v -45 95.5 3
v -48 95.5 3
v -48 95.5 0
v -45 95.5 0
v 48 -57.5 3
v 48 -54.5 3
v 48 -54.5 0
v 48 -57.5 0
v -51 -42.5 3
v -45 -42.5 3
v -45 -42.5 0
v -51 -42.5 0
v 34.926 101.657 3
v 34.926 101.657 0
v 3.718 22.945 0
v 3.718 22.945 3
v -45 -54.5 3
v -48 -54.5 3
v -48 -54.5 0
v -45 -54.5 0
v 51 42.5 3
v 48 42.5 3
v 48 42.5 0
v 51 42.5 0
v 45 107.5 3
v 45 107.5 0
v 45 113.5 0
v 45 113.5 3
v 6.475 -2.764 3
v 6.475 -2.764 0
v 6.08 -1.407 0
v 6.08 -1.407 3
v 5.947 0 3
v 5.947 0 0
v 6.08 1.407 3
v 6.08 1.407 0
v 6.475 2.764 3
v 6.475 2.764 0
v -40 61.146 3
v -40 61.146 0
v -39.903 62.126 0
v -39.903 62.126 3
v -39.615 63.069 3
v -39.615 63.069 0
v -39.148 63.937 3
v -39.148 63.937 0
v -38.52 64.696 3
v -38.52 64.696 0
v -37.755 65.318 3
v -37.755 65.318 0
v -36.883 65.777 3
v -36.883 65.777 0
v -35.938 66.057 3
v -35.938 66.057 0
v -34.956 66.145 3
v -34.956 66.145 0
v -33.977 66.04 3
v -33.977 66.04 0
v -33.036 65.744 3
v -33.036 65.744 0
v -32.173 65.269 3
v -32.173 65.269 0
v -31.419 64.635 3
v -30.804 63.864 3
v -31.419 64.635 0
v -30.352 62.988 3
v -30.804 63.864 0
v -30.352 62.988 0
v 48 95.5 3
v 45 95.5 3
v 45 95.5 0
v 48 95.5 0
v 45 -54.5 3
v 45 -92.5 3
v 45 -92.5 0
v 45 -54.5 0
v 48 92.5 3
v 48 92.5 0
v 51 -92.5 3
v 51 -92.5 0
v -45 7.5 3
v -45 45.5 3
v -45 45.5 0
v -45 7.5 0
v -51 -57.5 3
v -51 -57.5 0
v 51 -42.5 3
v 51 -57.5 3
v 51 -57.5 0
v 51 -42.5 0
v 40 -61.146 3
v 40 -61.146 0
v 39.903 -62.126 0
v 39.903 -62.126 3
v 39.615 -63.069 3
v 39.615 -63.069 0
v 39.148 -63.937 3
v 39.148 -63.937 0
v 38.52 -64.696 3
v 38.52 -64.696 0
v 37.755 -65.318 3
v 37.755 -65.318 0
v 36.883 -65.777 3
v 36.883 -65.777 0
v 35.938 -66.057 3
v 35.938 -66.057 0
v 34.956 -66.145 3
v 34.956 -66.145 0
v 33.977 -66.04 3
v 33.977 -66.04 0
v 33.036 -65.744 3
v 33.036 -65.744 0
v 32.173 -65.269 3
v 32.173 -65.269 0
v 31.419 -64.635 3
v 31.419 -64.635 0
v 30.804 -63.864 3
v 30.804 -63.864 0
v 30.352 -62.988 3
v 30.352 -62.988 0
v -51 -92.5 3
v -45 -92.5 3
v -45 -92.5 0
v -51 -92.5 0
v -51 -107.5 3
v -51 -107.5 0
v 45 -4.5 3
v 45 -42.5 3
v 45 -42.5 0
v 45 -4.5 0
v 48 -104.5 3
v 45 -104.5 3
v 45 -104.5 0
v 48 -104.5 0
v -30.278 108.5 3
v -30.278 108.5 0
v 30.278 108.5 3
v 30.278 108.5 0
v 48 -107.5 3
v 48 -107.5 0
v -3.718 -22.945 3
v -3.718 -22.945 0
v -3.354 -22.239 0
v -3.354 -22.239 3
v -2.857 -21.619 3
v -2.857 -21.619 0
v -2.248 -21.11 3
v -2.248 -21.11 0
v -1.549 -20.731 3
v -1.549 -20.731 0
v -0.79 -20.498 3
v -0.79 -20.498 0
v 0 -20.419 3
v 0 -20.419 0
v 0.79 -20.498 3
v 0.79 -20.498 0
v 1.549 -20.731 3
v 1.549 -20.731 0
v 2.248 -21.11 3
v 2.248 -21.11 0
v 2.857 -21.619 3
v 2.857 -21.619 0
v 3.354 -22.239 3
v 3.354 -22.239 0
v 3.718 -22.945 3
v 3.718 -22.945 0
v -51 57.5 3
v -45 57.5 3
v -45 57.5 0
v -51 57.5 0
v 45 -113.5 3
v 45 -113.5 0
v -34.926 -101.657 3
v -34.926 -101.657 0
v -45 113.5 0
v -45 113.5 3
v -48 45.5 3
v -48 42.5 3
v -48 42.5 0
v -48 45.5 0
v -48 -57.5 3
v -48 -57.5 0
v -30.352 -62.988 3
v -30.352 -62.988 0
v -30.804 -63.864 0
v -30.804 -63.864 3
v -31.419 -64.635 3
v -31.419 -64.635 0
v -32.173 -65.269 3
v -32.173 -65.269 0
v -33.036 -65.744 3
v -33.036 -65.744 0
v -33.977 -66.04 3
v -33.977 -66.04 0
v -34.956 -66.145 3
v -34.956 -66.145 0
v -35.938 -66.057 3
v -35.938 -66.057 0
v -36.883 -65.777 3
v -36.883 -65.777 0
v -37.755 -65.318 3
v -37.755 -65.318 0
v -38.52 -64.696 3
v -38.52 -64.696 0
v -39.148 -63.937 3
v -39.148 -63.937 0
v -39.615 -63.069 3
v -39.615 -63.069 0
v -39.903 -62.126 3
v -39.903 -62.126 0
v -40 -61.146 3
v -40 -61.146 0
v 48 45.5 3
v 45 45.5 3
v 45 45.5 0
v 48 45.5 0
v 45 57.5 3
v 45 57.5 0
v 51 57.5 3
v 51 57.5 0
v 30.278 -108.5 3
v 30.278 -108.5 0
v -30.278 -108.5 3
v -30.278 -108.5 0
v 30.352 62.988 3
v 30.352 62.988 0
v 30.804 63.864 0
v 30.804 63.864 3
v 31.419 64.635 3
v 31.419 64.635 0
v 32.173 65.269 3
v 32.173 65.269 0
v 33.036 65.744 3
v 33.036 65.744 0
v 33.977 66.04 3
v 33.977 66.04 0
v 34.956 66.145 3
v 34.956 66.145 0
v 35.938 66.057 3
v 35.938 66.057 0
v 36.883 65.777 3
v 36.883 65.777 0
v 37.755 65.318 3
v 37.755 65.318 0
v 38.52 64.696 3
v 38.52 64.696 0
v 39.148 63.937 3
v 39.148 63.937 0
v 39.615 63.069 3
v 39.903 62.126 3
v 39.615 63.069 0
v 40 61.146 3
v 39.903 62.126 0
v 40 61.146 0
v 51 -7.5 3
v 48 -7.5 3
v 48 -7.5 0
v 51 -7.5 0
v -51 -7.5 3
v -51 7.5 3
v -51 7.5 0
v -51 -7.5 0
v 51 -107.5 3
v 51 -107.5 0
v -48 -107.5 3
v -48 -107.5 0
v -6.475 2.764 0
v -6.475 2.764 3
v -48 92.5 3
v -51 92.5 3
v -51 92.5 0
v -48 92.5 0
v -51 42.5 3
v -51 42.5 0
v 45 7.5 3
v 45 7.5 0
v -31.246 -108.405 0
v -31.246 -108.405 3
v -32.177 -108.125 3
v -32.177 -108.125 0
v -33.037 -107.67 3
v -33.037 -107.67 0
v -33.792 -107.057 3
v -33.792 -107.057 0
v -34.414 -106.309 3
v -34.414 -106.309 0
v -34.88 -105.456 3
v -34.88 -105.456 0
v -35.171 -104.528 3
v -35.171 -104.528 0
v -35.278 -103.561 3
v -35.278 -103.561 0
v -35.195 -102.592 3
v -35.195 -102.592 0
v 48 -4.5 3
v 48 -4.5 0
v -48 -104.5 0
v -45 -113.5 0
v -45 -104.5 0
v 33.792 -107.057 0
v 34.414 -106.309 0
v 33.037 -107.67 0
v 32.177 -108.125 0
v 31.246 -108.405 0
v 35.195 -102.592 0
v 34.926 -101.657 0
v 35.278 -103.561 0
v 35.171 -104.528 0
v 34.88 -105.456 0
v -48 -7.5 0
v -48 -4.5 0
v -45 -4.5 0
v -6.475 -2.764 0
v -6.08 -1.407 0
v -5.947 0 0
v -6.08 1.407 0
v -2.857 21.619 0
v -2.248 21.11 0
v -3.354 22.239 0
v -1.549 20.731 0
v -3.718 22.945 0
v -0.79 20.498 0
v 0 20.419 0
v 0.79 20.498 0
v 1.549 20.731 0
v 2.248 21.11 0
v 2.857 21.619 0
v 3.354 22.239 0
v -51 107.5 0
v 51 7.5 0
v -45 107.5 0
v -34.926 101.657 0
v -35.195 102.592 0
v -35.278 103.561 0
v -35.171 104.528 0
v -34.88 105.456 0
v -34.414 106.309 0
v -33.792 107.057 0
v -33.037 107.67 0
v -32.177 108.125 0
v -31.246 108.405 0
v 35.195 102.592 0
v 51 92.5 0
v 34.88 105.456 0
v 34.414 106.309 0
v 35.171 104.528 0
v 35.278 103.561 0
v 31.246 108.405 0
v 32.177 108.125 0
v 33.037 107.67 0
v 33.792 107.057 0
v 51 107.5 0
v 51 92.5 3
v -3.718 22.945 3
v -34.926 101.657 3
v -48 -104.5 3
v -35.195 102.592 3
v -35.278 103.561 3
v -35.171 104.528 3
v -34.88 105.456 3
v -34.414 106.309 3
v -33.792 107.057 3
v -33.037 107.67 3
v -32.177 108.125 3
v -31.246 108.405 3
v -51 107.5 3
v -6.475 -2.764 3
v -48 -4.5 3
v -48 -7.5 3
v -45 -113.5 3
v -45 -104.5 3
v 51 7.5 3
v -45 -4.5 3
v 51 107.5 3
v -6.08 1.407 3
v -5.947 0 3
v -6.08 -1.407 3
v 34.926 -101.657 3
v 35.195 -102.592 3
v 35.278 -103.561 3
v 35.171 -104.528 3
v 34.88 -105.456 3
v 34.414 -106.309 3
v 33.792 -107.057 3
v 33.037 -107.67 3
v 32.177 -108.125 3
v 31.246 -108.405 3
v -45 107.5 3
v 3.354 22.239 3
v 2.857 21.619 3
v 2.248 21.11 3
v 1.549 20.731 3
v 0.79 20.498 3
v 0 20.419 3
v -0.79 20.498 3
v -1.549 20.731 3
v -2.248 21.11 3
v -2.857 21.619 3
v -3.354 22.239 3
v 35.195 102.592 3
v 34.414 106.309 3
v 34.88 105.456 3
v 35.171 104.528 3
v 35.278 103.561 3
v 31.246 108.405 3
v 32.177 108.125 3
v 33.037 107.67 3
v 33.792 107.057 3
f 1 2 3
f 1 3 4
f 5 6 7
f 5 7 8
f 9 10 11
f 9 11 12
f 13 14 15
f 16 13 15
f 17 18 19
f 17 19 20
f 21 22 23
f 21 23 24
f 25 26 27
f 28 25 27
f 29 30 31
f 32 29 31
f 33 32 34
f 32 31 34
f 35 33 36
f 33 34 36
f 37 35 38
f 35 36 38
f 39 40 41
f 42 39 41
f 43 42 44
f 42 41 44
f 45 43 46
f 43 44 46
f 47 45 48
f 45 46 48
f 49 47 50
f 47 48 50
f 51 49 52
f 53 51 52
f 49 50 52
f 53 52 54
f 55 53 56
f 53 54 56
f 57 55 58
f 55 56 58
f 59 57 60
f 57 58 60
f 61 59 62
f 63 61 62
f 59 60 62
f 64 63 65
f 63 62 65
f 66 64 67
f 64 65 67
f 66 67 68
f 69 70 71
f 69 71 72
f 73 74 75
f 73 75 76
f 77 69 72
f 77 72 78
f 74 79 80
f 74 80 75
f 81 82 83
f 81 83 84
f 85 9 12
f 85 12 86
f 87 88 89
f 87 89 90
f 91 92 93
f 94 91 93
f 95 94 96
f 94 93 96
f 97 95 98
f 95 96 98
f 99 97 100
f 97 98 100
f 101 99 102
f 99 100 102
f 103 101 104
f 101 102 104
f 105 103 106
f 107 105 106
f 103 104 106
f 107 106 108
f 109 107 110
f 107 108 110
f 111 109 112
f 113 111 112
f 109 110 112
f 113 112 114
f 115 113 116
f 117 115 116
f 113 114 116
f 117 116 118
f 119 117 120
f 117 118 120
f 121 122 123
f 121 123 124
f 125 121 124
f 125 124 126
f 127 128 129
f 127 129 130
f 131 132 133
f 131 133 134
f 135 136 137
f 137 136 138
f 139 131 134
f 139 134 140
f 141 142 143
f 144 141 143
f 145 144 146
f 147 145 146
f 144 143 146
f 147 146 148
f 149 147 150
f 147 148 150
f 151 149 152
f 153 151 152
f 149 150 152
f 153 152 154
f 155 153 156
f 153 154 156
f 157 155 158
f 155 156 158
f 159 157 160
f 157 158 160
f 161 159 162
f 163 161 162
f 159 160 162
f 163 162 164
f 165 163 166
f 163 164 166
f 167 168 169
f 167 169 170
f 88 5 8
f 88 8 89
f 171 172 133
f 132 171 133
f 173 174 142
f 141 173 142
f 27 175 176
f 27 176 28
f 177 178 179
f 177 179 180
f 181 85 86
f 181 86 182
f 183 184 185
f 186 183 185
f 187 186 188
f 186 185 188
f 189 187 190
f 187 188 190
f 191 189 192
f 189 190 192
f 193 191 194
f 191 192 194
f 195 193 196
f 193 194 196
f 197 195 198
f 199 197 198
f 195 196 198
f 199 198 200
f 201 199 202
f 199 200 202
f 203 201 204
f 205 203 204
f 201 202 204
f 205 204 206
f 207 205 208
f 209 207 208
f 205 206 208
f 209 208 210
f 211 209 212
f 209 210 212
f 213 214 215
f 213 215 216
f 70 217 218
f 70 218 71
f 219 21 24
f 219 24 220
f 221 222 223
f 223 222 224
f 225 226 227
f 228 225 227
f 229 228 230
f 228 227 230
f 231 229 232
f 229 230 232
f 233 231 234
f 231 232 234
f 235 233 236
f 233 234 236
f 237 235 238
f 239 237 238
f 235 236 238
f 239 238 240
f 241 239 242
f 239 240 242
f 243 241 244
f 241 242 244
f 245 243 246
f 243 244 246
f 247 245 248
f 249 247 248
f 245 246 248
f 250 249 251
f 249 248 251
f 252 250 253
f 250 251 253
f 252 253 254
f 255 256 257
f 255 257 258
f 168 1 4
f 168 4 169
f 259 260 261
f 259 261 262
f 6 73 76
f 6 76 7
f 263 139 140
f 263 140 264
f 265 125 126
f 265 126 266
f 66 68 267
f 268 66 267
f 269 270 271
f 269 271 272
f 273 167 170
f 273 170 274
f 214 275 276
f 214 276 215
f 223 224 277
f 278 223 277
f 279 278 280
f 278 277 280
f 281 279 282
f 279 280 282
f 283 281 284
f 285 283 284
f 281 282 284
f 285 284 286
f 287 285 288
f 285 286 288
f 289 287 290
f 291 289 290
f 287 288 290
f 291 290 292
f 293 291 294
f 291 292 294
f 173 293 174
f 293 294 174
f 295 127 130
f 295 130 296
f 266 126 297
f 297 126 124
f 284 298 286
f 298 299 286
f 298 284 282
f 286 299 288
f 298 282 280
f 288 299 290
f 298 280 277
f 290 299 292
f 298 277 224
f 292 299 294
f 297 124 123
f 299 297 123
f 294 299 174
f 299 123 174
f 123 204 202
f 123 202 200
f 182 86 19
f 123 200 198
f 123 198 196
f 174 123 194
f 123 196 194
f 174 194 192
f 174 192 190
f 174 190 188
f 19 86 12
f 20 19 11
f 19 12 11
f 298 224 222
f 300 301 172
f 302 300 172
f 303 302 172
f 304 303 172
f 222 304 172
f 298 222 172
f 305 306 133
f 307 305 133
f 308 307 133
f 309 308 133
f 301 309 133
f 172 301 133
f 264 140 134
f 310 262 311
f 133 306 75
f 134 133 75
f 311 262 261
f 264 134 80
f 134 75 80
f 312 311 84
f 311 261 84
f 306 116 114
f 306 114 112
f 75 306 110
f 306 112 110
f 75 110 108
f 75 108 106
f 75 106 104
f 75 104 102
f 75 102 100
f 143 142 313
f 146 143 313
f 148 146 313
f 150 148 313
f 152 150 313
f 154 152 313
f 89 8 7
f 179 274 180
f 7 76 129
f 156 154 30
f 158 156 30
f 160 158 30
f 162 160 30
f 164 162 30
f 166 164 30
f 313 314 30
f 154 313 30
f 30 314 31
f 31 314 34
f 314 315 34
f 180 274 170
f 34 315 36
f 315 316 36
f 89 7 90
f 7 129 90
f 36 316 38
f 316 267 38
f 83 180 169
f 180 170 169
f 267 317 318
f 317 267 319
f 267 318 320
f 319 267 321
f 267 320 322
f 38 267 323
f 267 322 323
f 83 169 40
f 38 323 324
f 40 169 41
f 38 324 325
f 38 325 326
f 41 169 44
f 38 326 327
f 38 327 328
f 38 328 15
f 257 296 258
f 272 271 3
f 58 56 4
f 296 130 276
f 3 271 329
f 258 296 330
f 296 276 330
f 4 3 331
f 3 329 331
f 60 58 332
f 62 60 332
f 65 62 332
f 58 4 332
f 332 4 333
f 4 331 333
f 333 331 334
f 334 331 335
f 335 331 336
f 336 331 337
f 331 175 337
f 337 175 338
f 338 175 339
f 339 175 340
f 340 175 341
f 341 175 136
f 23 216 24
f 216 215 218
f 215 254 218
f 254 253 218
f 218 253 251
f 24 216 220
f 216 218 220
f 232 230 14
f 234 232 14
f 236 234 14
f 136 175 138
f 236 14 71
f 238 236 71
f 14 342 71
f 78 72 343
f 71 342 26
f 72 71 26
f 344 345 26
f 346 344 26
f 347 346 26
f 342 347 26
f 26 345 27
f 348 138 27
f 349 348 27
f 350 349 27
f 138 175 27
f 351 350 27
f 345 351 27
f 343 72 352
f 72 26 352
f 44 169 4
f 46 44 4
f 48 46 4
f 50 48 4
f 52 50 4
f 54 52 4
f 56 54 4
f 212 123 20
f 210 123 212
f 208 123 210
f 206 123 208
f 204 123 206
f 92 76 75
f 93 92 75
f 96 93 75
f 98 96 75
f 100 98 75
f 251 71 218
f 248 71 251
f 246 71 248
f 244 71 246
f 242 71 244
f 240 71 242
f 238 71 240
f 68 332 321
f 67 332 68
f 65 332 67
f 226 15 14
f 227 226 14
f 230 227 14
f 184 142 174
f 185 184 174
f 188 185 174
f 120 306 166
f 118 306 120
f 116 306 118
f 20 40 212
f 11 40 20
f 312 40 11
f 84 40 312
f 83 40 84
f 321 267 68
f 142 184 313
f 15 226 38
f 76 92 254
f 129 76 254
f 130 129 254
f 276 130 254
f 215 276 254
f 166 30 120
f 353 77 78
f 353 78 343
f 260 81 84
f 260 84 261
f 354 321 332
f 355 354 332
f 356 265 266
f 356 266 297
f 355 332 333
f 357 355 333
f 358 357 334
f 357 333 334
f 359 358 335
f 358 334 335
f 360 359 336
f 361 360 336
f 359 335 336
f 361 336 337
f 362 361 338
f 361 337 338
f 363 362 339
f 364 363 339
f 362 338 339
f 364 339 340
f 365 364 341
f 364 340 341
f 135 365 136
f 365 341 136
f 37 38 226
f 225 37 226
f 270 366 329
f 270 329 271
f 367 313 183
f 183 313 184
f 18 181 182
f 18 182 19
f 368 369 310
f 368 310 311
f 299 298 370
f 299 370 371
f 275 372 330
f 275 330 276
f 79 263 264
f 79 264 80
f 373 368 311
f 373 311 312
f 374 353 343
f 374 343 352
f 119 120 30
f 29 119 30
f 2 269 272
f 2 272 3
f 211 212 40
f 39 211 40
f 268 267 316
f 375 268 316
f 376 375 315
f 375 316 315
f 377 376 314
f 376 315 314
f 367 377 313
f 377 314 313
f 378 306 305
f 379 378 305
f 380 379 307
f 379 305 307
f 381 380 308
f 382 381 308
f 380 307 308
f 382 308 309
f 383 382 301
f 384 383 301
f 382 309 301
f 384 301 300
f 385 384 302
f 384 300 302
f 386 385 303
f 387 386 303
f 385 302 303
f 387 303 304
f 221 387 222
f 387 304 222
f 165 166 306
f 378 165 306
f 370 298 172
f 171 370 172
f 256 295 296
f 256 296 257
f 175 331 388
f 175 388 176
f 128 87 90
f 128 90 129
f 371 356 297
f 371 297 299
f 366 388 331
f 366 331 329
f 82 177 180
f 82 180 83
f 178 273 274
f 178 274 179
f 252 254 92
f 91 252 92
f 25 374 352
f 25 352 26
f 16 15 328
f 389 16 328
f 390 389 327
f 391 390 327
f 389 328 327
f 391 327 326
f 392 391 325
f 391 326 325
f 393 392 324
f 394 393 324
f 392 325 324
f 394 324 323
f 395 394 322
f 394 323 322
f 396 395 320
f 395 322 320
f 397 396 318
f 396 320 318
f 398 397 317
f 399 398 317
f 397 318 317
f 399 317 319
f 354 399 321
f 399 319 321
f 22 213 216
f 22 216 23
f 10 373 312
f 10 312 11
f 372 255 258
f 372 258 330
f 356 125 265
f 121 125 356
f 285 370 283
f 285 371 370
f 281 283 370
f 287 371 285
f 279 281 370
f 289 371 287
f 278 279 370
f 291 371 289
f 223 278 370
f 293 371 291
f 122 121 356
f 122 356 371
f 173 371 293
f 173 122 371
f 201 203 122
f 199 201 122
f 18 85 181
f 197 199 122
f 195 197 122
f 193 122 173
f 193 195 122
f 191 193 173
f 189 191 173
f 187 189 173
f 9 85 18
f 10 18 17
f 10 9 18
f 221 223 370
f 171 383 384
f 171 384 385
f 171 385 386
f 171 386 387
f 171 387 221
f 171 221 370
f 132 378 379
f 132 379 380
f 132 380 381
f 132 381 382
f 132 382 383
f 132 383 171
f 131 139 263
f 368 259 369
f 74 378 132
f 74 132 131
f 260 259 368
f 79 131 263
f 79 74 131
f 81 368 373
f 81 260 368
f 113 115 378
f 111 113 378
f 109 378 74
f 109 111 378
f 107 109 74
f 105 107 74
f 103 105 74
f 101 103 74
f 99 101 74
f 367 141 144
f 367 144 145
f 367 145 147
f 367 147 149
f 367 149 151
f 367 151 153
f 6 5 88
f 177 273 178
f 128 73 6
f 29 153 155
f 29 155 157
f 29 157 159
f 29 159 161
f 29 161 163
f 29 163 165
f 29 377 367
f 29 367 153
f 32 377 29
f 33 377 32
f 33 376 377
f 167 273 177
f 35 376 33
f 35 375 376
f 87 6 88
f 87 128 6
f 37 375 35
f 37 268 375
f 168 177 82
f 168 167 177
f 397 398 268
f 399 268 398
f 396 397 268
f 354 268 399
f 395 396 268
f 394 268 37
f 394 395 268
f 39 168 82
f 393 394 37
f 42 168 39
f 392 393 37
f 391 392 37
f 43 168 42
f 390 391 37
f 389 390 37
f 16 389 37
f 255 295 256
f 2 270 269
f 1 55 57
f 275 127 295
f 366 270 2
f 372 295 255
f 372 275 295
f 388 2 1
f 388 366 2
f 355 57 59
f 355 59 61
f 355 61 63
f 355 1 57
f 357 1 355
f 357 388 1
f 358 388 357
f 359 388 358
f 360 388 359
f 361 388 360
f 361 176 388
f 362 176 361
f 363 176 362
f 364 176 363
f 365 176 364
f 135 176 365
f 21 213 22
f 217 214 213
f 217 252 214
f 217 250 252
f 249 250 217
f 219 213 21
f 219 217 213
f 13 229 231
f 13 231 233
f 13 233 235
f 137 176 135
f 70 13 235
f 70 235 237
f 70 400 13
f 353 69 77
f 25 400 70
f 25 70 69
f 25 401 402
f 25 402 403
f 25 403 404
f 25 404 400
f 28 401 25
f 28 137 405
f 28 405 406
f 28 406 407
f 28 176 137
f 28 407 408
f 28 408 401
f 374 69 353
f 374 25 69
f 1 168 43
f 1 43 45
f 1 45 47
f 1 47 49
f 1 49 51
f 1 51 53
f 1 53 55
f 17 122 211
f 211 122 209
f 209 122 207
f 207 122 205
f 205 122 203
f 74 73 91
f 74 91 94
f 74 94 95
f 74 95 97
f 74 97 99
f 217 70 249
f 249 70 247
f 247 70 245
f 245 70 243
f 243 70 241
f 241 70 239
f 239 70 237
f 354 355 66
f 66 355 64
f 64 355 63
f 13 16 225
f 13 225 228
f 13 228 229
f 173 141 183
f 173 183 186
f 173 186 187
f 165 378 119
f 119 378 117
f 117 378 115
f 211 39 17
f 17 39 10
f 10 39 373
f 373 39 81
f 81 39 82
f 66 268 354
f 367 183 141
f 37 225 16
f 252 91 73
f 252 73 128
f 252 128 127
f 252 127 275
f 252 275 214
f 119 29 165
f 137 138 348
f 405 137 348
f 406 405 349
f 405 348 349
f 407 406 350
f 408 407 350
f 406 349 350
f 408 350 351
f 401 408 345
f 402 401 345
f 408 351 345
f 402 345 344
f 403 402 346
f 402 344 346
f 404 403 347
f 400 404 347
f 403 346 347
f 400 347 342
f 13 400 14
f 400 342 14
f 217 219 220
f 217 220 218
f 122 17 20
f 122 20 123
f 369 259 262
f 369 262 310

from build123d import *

# Parameters (mm, degrees)
F0_W     = 90
F0_H     = 227
F1_DEPTH = 3
F3_DEPTH = 3


# Not quite as in the source:
# - a feature names something its author has since deleted; it is built from what else it names


with BuildPart() as f1:
    # F0 (on Top) → F1 (new body)
    with BuildSketch(Plane.XY):
        Rectangle(F0_W, F0_H)
        with BuildLine():
            ThreePointArc((-30.2779513906, -108.4999991059), (-34.4140194322, -106.3094369778), (-34.9259618692, -101.6571755682))
            Line((-34.9259618692, -101.6571755682), (-3.7184084714, -22.9447908871))
            ThreePointArc((-3.7184084714, -22.9447908871), (-8.85e-08, -20.4190497173), (3.7184082943, -22.9447908871))
            Line((3.7184082943, -22.9447908871), (34.9259616921, -101.6571755682))
            ThreePointArc((34.9259616921, -101.6571755682), (34.4140192551, -106.3094369778), (30.2779512136, -108.4999991059))
            Line((30.2779512136, -108.4999991059), (-30.2779513906, -108.4999991059))
        make_face(mode=Mode.SUBTRACT)
        with BuildLine():
            ThreePointArc((-40, 61.145500066), (-35.9380691891, 66.0567143962), (-30.3519895215, 62.9883236038))
            Line((-30.3519895215, 62.9883236038), (-6.4745976856, 2.7642353066))
            ThreePointArc((-6.4745976856, 2.7642353066), (-5.9466134034, 0), (-6.4745976856, -2.7642353066))
            Line((-6.4745976856, -2.7642353066), (-30.3519895215, -62.9883236038))
            ThreePointArc((-30.3519895214, -62.9883236038), (-35.9380691891, -66.0567143962), (-40, -61.145500066))
            Line((-40, -61.145500066), (-40, 61.145500066))
        make_face(mode=Mode.SUBTRACT)
        with BuildLine():
            ThreePointArc((30.2779512136, 108.4999991059), (34.4140192551, 106.3094369778), (34.9259616921, 101.6571755682))
            Line((34.9259616921, 101.6571755682), (3.7184082943, 22.9447908871))
            ThreePointArc((3.7184082943, 22.9447908871), (-8.85e-08, 20.4190497173), (-3.7184084714, 22.9447908871))
            Line((-3.7184084714, 22.9447908871), (-34.9259618692, 101.6571755682))
            ThreePointArc((-34.9259618692, 101.6571755682), (-34.4140194322, 106.3094369778), (-30.2779513906, 108.4999991059))
            Line((-30.2779513906, 108.4999991059), (30.2779512136, 108.4999991059))
        make_face(mode=Mode.SUBTRACT)
        with BuildLine():
            Line((6.4745976856, 2.7642353066), (30.3519895215, 62.9883236038))
            ThreePointArc((30.3519895215, 62.9883236038), (35.9380691891, 66.0567143962), (40, 61.145500066))
            Line((40, 61.145500066), (40, -61.145500066))
            ThreePointArc((40, -61.145500066), (35.9380691891, -66.0567143962), (30.3519895214, -62.9883236038))
            Line((30.3519895215, -62.9883236038), (6.4745976856, -2.7642353066))
            ThreePointArc((6.4745976856, -2.7642353066), (5.9466134034, 0), (6.4745976856, 2.7642353066))
        make_face(mode=Mode.SUBTRACT)
    extrude(amount=F1_DEPTH)

    # F2 (on face) → F3 (join, through all)
    with BuildSketch(Plane.XY.offset(3)):
        Polygon((-45, 95.5), (-45, 107.5), (-51, 107.5), (-51, 92.5), (-48, 92.5), (-48, 95.5), align=None)
        Polygon((51, 107.5), (45, 107.5), (45, 95.5), (48, 95.5), (48, 92.5), (51, 92.5), align=None)
        Polygon((-45, 45.5), (-45, 57.5), (-51, 57.5), (-51, 42.5), (-48, 42.5), (-48, 45.5), align=None)
        Polygon((51, 57.5), (45, 57.5), (45, 45.5), (48, 45.5), (48, 42.5), (51, 42.5), align=None)
        Polygon((-45, 113.5), (-45, 107.5), (-45, 95.5), (-45, 57.5), (-45, 45.5), (-45, 7.5), (-45, -4.5), (-45, -42.5), (-45, -54.5), (-45, -92.5), (-45, -104.5), (-45, -113.5), (45, -113.5), (45, -104.5), (45, -92.5), (45, -54.5), (45, -42.5), (45, -4.5), (45, 7.5), (45, 45.5), (45, 57.5), (45, 95.5), (45, 107.5), (45, 113.5), align=None)
        with BuildLine():
            Line((3.7184082943, -22.9447908871), (34.9259616921, -101.6571755682))
            ThreePointArc((34.9259616921, -101.6571755682), (34.4140192551, -106.3094369778), (30.2779512136, -108.4999991059))
            Line((30.2779512136, -108.4999991059), (-30.2779513906, -108.4999991059))
            ThreePointArc((-30.2779513906, -108.4999991059), (-34.4140194322, -106.3094369778), (-34.9259618692, -101.6571755682))
            Line((-34.9259618692, -101.6571755682), (-3.7184084714, -22.9447908871))
            ThreePointArc((-3.7184084714, -22.9447908871), (-8.85e-08, -20.4190497173), (3.7184082943, -22.9447908871))
        make_face(mode=Mode.SUBTRACT)
        with BuildLine():
            ThreePointArc((-30.3519895214, -62.9883236038), (-35.9380691891, -66.0567143962), (-40, -61.145500066))
            Line((-40, -61.145500066), (-40, 61.145500066))
            ThreePointArc((-40, 61.145500066), (-35.9380691891, 66.0567143962), (-30.3519895215, 62.9883236038))
            Line((-30.3519895215, 62.9883236038), (-6.4745976856, 2.7642353066))
            ThreePointArc((-6.4745976856, 2.7642353066), (-5.9466134034, 0), (-6.4745976856, -2.7642353066))
            Line((-6.4745976856, -2.7642353066), (-30.3519895215, -62.9883236038))
        make_face(mode=Mode.SUBTRACT)
        with BuildLine():
            ThreePointArc((-34.9259618692, 101.6571755682), (-34.4140194322, 106.3094369778), (-30.2779513906, 108.4999991059))
            Line((-30.2779513906, 108.4999991059), (30.2779512136, 108.4999991059))
            ThreePointArc((30.2779512136, 108.4999991059), (34.4140192551, 106.3094369778), (34.9259616921, 101.6571755682))
            Line((34.9259616921, 101.6571755682), (3.7184082943, 22.9447908871))
            ThreePointArc((3.7184082943, 22.9447908871), (-8.85e-08, 20.4190497173), (-3.7184084714, 22.9447908871))
            Line((-3.7184084714, 22.9447908871), (-34.9259618692, 101.6571755682))
        make_face(mode=Mode.SUBTRACT)
        with BuildLine():
            ThreePointArc((6.4745976856, -2.7642353066), (5.9466134034, 0), (6.4745976856, 2.7642353066))
            Line((6.4745976856, 2.7642353066), (30.3519895215, 62.9883236038))
            ThreePointArc((30.3519895215, 62.9883236038), (35.9380691891, 66.0567143962), (40, 61.145500066))
            Line((40, 61.145500066), (40, -61.145500066))
            ThreePointArc((40, -61.145500066), (35.9380691891, -66.0567143962), (30.3519895214, -62.9883236038))
            Line((30.3519895215, -62.9883236038), (6.4745976856, -2.7642353066))
        make_face(mode=Mode.SUBTRACT)
        Polygon((-45, -4.5), (-45, 7.5), (-51, 7.5), (-51, -7.5), (-48, -7.5), (-48, -4.5), align=None)
        Polygon((-45, -54.5), (-45, -42.5), (-51, -42.5), (-51, -57.5), (-48, -57.5), (-48, -54.5), align=None)
        Polygon((-45, -104.5), (-45, -92.5), (-51, -92.5), (-51, -107.5), (-48, -107.5), (-48, -104.5), align=None)
        Polygon((51, -92.5), (45, -92.5), (45, -104.5), (48, -104.5), (48, -107.5), (51, -107.5), align=None)
        Polygon((51, -42.5), (45, -42.5), (45, -54.5), (48, -54.5), (48, -57.5), (51, -57.5), align=None)
        Polygon((51, 7.5), (45, 7.5), (45, -4.5), (48, -4.5), (48, -7.5), (51, -7.5), align=None)
    extrude(amount=-F3_DEPTH)


solid = f1.part
